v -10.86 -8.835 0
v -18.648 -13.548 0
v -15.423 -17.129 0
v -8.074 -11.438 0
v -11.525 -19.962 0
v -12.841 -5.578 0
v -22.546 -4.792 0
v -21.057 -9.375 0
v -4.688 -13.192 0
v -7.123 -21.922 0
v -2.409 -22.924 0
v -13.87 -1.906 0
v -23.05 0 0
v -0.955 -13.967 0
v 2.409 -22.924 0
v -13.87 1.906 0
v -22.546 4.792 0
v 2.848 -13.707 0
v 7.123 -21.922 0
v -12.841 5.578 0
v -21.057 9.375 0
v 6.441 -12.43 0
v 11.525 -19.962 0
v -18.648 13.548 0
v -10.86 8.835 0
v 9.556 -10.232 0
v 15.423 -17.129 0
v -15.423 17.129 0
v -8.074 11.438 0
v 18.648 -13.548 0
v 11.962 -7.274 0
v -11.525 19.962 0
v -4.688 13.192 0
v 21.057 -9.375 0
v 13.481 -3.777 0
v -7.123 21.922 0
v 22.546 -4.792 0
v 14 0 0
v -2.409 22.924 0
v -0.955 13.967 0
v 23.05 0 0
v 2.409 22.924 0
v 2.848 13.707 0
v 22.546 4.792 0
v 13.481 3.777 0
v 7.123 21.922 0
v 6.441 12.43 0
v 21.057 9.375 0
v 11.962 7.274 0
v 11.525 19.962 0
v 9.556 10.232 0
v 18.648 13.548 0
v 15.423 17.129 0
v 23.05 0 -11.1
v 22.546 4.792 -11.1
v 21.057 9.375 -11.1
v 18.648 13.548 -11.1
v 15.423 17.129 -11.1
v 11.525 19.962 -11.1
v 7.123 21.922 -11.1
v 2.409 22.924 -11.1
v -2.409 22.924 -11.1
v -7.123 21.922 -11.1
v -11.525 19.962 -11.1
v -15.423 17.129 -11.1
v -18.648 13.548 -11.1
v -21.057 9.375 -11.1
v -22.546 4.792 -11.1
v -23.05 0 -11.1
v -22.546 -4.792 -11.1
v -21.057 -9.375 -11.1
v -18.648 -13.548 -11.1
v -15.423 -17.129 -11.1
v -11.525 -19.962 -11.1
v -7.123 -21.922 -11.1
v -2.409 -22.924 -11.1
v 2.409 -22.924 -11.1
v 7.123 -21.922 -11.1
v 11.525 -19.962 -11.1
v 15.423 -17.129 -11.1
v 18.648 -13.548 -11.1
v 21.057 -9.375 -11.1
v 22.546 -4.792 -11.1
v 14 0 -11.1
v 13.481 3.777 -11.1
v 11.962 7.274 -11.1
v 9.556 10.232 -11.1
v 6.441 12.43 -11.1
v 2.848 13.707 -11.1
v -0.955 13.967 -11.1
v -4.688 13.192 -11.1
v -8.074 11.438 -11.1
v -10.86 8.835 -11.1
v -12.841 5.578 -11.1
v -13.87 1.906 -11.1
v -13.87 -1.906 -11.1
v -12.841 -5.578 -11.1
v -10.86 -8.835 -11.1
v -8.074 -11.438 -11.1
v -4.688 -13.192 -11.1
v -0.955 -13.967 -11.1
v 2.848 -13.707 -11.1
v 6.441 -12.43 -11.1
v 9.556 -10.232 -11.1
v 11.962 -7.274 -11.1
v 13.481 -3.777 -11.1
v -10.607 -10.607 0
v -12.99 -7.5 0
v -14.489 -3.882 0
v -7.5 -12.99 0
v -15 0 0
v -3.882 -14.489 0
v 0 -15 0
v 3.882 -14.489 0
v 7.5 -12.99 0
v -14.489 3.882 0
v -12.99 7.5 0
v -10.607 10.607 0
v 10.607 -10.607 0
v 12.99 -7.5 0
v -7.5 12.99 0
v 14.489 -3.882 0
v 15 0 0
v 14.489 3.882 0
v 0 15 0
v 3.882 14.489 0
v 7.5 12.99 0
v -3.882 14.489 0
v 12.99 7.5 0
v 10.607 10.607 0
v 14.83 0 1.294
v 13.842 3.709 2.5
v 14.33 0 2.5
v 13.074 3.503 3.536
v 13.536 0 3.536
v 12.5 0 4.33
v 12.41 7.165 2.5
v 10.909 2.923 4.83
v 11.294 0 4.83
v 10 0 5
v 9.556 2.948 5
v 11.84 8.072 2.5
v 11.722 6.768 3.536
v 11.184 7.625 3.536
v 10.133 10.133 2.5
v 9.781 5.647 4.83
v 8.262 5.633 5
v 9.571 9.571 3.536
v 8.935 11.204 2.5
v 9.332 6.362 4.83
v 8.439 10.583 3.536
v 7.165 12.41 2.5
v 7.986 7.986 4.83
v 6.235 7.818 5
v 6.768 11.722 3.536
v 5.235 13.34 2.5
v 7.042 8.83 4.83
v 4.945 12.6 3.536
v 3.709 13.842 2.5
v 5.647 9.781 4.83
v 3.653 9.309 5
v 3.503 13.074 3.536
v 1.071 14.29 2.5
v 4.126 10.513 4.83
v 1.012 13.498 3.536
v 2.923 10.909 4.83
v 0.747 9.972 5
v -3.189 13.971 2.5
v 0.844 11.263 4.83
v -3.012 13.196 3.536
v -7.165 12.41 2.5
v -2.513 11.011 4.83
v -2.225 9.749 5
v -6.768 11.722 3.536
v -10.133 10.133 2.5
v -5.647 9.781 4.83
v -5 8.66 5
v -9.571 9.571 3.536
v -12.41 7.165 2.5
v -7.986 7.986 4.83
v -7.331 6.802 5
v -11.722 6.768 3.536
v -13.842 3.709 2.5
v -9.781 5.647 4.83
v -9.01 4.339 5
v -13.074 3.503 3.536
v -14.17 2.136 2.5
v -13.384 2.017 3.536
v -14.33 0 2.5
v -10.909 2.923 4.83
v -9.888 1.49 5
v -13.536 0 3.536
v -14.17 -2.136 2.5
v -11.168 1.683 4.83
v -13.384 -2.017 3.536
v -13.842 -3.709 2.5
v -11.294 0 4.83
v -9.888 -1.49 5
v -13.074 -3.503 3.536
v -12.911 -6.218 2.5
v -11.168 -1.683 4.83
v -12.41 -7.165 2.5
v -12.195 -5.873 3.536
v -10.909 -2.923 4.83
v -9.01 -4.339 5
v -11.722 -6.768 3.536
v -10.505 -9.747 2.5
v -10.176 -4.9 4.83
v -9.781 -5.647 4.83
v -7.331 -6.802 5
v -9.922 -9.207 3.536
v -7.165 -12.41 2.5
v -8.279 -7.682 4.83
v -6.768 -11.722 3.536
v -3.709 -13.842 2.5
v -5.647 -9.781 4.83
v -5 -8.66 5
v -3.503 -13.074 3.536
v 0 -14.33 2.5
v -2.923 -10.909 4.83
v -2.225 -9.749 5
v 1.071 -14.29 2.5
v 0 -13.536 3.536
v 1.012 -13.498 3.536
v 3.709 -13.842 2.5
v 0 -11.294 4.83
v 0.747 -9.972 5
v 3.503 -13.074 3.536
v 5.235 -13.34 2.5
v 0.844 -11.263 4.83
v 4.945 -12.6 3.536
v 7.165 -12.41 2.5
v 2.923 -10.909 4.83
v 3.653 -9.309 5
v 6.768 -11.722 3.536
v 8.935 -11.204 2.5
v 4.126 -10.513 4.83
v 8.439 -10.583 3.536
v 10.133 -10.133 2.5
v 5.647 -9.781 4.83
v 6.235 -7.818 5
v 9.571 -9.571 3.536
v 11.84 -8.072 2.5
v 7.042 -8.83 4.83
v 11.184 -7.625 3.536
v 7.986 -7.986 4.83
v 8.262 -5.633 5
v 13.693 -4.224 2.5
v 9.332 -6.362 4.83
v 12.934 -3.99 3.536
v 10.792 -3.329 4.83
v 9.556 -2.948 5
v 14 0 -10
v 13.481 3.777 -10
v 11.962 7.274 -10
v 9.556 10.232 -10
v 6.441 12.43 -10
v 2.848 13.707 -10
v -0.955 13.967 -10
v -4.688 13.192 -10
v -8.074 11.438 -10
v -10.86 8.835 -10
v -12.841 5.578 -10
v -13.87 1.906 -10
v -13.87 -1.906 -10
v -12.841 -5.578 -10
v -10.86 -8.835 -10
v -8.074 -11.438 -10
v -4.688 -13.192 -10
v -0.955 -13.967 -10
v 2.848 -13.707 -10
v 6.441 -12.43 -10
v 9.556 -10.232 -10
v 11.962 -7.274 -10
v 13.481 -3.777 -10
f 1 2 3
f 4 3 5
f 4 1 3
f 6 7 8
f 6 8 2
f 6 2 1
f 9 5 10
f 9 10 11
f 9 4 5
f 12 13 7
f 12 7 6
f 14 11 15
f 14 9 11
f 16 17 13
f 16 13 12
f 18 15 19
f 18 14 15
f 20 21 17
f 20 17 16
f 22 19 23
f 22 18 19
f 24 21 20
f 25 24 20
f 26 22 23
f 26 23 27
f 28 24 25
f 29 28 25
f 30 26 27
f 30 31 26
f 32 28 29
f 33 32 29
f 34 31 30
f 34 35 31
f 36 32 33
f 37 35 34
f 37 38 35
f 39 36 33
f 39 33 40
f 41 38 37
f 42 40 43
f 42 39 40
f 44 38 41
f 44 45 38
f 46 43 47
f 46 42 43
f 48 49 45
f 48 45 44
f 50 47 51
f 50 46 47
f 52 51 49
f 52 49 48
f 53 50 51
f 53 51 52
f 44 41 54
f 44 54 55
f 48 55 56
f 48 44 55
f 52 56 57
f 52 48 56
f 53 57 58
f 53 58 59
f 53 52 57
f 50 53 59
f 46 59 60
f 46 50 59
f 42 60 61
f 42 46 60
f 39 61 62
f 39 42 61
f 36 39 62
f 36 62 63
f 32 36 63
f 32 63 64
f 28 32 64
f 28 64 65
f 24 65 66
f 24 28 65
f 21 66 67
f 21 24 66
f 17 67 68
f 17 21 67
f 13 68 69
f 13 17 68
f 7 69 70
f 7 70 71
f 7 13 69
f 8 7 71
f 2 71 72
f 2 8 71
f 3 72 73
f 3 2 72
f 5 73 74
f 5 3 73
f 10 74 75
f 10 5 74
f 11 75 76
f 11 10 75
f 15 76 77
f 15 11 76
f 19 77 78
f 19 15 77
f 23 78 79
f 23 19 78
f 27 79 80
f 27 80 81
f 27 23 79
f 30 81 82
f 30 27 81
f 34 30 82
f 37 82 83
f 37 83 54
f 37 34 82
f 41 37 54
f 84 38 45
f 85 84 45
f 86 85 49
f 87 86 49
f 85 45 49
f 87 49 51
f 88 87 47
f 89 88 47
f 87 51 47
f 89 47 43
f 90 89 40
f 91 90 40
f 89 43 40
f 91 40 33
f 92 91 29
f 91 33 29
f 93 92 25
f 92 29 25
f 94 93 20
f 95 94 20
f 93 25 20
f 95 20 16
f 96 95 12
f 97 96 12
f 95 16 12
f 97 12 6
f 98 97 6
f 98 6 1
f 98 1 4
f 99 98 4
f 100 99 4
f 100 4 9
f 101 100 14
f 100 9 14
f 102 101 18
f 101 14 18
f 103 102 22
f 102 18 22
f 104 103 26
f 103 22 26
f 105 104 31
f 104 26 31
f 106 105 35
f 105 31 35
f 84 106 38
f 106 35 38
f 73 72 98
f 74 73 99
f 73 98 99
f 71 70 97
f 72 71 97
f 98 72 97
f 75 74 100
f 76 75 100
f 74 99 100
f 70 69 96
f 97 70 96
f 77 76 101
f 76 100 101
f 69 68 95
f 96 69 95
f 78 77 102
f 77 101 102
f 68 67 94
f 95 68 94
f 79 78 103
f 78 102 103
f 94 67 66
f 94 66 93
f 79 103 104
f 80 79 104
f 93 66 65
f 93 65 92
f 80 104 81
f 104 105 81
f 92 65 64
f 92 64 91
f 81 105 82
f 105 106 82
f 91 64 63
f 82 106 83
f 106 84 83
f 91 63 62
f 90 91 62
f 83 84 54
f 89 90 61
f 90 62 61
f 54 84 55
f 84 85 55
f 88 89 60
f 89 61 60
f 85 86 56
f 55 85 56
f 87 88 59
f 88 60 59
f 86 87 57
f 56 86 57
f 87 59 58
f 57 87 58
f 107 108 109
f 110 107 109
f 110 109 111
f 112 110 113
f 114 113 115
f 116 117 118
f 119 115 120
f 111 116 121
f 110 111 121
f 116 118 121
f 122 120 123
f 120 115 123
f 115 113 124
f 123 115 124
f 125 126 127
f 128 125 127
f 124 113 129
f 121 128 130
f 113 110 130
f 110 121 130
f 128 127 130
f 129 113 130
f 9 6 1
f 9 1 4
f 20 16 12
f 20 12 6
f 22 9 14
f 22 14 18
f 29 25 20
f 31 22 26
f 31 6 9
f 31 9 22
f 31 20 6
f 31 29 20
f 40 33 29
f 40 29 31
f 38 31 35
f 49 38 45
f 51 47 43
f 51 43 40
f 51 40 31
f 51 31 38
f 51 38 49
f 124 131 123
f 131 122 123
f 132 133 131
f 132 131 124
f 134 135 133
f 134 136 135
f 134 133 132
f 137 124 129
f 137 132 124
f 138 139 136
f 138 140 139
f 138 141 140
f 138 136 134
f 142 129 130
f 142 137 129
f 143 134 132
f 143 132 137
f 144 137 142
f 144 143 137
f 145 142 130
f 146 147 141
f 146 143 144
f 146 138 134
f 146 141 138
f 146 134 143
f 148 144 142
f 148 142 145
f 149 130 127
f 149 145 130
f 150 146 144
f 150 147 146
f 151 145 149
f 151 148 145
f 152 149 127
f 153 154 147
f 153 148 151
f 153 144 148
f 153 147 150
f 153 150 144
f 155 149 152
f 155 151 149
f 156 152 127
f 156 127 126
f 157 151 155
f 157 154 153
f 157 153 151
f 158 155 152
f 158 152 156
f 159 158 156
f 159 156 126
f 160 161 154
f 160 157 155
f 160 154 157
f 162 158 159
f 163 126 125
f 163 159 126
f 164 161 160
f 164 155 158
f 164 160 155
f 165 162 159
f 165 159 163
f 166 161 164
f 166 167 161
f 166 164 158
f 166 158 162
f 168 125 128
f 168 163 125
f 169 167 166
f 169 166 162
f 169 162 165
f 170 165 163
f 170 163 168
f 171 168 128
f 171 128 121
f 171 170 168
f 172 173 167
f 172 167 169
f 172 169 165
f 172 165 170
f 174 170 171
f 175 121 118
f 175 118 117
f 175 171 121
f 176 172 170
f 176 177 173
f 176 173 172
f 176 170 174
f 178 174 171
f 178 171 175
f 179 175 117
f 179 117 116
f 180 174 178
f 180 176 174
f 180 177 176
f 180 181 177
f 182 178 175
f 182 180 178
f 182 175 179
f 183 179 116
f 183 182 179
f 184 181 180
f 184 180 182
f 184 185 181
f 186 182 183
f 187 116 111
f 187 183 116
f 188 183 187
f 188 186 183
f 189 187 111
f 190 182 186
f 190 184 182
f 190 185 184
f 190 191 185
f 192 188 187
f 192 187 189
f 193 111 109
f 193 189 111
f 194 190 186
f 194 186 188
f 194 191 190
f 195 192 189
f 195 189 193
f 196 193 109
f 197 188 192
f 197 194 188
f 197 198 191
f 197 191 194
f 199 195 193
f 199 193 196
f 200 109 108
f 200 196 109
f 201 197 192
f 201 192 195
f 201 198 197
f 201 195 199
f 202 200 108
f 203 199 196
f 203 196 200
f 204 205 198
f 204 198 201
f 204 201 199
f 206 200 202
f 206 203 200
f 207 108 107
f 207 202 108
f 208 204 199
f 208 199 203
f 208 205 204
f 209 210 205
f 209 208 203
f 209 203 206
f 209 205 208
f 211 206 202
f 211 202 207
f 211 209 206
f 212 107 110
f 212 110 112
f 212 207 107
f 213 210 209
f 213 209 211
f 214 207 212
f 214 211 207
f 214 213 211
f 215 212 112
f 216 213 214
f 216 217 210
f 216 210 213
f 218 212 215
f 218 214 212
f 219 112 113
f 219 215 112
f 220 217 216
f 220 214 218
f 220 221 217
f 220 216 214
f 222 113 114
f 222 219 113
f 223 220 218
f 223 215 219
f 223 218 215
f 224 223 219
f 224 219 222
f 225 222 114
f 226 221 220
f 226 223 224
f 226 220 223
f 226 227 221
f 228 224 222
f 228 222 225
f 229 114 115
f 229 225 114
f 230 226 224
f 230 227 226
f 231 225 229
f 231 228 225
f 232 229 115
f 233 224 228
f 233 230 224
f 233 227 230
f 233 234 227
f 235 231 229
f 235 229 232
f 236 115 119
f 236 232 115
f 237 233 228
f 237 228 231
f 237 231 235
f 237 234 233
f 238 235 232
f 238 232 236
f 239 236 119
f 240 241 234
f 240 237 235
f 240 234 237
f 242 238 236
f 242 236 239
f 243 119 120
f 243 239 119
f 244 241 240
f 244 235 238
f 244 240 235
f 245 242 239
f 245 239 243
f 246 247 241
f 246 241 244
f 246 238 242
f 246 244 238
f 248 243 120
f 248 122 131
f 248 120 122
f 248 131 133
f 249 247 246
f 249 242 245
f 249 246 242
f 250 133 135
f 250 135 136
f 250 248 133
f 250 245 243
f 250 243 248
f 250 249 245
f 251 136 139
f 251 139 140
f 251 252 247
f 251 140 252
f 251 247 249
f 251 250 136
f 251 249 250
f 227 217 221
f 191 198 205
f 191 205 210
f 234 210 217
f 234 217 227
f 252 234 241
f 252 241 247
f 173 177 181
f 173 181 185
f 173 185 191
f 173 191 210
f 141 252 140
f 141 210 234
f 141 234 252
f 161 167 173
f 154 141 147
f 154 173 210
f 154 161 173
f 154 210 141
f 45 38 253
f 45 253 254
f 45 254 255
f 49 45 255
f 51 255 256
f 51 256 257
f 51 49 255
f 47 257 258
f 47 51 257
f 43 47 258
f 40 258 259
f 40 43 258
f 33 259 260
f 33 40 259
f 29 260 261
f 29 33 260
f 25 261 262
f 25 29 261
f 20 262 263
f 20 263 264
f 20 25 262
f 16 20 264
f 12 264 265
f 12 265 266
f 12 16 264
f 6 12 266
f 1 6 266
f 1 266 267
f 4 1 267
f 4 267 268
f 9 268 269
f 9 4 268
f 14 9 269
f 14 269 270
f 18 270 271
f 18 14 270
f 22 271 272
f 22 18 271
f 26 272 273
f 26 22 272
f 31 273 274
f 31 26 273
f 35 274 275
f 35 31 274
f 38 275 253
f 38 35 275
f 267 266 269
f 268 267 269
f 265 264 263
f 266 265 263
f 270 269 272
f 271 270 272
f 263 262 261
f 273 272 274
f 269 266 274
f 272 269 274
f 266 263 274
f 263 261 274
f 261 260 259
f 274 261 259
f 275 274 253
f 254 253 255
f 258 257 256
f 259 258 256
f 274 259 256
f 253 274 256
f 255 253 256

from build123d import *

# Parameters (mm, degrees)
F0_R     = 15
F0_R_2   = 14
F1_DEPTH = 5
F2_DEPTH = 10
F0_R_3   = 23.05
F3_DEPTH = 11.1
F4_R     = 4.99999


# Not quite as in the source:
# - a fillet or chamfer is up to 0.001 mm smaller than in the source, because OpenCascade refuses the exact size


with BuildPart() as f1:
    # F0 (on Top) → F1 (new body)
    with BuildSketch(Plane.XY):
        Circle(F0_R)
        Circle(F0_R_2, mode=Mode.SUBTRACT)
        Circle(F0_R_2)
    extrude(amount=F1_DEPTH)

    # F4 (radius 5 in the source; OpenCascade refuses exactly that, so slightly less here)
    f4_edges = [f1.edges().sort_by_distance(p)[0] for p in [
        (-15, 0, 5),
    ]]
    fillet(f4_edges, radius=F4_R)


with BuildPart() as f2:
    # F0 (on Top) → F2 (new body)
    with BuildSketch(Plane.XY):
        Circle(F0_R_2)
    extrude(amount=-F2_DEPTH)


with BuildPart() as f3:
    # F0 (on Top) → F3 (new body)
    with BuildSketch(Plane.XY):
        Circle(F0_R_3)
        Circle(F0_R, mode=Mode.SUBTRACT)
        Circle(F0_R)
        Circle(F0_R_2, mode=Mode.SUBTRACT)
    extrude(amount=-F3_DEPTH)


solid = Compound([f1.part, f2.part, f3.part])
